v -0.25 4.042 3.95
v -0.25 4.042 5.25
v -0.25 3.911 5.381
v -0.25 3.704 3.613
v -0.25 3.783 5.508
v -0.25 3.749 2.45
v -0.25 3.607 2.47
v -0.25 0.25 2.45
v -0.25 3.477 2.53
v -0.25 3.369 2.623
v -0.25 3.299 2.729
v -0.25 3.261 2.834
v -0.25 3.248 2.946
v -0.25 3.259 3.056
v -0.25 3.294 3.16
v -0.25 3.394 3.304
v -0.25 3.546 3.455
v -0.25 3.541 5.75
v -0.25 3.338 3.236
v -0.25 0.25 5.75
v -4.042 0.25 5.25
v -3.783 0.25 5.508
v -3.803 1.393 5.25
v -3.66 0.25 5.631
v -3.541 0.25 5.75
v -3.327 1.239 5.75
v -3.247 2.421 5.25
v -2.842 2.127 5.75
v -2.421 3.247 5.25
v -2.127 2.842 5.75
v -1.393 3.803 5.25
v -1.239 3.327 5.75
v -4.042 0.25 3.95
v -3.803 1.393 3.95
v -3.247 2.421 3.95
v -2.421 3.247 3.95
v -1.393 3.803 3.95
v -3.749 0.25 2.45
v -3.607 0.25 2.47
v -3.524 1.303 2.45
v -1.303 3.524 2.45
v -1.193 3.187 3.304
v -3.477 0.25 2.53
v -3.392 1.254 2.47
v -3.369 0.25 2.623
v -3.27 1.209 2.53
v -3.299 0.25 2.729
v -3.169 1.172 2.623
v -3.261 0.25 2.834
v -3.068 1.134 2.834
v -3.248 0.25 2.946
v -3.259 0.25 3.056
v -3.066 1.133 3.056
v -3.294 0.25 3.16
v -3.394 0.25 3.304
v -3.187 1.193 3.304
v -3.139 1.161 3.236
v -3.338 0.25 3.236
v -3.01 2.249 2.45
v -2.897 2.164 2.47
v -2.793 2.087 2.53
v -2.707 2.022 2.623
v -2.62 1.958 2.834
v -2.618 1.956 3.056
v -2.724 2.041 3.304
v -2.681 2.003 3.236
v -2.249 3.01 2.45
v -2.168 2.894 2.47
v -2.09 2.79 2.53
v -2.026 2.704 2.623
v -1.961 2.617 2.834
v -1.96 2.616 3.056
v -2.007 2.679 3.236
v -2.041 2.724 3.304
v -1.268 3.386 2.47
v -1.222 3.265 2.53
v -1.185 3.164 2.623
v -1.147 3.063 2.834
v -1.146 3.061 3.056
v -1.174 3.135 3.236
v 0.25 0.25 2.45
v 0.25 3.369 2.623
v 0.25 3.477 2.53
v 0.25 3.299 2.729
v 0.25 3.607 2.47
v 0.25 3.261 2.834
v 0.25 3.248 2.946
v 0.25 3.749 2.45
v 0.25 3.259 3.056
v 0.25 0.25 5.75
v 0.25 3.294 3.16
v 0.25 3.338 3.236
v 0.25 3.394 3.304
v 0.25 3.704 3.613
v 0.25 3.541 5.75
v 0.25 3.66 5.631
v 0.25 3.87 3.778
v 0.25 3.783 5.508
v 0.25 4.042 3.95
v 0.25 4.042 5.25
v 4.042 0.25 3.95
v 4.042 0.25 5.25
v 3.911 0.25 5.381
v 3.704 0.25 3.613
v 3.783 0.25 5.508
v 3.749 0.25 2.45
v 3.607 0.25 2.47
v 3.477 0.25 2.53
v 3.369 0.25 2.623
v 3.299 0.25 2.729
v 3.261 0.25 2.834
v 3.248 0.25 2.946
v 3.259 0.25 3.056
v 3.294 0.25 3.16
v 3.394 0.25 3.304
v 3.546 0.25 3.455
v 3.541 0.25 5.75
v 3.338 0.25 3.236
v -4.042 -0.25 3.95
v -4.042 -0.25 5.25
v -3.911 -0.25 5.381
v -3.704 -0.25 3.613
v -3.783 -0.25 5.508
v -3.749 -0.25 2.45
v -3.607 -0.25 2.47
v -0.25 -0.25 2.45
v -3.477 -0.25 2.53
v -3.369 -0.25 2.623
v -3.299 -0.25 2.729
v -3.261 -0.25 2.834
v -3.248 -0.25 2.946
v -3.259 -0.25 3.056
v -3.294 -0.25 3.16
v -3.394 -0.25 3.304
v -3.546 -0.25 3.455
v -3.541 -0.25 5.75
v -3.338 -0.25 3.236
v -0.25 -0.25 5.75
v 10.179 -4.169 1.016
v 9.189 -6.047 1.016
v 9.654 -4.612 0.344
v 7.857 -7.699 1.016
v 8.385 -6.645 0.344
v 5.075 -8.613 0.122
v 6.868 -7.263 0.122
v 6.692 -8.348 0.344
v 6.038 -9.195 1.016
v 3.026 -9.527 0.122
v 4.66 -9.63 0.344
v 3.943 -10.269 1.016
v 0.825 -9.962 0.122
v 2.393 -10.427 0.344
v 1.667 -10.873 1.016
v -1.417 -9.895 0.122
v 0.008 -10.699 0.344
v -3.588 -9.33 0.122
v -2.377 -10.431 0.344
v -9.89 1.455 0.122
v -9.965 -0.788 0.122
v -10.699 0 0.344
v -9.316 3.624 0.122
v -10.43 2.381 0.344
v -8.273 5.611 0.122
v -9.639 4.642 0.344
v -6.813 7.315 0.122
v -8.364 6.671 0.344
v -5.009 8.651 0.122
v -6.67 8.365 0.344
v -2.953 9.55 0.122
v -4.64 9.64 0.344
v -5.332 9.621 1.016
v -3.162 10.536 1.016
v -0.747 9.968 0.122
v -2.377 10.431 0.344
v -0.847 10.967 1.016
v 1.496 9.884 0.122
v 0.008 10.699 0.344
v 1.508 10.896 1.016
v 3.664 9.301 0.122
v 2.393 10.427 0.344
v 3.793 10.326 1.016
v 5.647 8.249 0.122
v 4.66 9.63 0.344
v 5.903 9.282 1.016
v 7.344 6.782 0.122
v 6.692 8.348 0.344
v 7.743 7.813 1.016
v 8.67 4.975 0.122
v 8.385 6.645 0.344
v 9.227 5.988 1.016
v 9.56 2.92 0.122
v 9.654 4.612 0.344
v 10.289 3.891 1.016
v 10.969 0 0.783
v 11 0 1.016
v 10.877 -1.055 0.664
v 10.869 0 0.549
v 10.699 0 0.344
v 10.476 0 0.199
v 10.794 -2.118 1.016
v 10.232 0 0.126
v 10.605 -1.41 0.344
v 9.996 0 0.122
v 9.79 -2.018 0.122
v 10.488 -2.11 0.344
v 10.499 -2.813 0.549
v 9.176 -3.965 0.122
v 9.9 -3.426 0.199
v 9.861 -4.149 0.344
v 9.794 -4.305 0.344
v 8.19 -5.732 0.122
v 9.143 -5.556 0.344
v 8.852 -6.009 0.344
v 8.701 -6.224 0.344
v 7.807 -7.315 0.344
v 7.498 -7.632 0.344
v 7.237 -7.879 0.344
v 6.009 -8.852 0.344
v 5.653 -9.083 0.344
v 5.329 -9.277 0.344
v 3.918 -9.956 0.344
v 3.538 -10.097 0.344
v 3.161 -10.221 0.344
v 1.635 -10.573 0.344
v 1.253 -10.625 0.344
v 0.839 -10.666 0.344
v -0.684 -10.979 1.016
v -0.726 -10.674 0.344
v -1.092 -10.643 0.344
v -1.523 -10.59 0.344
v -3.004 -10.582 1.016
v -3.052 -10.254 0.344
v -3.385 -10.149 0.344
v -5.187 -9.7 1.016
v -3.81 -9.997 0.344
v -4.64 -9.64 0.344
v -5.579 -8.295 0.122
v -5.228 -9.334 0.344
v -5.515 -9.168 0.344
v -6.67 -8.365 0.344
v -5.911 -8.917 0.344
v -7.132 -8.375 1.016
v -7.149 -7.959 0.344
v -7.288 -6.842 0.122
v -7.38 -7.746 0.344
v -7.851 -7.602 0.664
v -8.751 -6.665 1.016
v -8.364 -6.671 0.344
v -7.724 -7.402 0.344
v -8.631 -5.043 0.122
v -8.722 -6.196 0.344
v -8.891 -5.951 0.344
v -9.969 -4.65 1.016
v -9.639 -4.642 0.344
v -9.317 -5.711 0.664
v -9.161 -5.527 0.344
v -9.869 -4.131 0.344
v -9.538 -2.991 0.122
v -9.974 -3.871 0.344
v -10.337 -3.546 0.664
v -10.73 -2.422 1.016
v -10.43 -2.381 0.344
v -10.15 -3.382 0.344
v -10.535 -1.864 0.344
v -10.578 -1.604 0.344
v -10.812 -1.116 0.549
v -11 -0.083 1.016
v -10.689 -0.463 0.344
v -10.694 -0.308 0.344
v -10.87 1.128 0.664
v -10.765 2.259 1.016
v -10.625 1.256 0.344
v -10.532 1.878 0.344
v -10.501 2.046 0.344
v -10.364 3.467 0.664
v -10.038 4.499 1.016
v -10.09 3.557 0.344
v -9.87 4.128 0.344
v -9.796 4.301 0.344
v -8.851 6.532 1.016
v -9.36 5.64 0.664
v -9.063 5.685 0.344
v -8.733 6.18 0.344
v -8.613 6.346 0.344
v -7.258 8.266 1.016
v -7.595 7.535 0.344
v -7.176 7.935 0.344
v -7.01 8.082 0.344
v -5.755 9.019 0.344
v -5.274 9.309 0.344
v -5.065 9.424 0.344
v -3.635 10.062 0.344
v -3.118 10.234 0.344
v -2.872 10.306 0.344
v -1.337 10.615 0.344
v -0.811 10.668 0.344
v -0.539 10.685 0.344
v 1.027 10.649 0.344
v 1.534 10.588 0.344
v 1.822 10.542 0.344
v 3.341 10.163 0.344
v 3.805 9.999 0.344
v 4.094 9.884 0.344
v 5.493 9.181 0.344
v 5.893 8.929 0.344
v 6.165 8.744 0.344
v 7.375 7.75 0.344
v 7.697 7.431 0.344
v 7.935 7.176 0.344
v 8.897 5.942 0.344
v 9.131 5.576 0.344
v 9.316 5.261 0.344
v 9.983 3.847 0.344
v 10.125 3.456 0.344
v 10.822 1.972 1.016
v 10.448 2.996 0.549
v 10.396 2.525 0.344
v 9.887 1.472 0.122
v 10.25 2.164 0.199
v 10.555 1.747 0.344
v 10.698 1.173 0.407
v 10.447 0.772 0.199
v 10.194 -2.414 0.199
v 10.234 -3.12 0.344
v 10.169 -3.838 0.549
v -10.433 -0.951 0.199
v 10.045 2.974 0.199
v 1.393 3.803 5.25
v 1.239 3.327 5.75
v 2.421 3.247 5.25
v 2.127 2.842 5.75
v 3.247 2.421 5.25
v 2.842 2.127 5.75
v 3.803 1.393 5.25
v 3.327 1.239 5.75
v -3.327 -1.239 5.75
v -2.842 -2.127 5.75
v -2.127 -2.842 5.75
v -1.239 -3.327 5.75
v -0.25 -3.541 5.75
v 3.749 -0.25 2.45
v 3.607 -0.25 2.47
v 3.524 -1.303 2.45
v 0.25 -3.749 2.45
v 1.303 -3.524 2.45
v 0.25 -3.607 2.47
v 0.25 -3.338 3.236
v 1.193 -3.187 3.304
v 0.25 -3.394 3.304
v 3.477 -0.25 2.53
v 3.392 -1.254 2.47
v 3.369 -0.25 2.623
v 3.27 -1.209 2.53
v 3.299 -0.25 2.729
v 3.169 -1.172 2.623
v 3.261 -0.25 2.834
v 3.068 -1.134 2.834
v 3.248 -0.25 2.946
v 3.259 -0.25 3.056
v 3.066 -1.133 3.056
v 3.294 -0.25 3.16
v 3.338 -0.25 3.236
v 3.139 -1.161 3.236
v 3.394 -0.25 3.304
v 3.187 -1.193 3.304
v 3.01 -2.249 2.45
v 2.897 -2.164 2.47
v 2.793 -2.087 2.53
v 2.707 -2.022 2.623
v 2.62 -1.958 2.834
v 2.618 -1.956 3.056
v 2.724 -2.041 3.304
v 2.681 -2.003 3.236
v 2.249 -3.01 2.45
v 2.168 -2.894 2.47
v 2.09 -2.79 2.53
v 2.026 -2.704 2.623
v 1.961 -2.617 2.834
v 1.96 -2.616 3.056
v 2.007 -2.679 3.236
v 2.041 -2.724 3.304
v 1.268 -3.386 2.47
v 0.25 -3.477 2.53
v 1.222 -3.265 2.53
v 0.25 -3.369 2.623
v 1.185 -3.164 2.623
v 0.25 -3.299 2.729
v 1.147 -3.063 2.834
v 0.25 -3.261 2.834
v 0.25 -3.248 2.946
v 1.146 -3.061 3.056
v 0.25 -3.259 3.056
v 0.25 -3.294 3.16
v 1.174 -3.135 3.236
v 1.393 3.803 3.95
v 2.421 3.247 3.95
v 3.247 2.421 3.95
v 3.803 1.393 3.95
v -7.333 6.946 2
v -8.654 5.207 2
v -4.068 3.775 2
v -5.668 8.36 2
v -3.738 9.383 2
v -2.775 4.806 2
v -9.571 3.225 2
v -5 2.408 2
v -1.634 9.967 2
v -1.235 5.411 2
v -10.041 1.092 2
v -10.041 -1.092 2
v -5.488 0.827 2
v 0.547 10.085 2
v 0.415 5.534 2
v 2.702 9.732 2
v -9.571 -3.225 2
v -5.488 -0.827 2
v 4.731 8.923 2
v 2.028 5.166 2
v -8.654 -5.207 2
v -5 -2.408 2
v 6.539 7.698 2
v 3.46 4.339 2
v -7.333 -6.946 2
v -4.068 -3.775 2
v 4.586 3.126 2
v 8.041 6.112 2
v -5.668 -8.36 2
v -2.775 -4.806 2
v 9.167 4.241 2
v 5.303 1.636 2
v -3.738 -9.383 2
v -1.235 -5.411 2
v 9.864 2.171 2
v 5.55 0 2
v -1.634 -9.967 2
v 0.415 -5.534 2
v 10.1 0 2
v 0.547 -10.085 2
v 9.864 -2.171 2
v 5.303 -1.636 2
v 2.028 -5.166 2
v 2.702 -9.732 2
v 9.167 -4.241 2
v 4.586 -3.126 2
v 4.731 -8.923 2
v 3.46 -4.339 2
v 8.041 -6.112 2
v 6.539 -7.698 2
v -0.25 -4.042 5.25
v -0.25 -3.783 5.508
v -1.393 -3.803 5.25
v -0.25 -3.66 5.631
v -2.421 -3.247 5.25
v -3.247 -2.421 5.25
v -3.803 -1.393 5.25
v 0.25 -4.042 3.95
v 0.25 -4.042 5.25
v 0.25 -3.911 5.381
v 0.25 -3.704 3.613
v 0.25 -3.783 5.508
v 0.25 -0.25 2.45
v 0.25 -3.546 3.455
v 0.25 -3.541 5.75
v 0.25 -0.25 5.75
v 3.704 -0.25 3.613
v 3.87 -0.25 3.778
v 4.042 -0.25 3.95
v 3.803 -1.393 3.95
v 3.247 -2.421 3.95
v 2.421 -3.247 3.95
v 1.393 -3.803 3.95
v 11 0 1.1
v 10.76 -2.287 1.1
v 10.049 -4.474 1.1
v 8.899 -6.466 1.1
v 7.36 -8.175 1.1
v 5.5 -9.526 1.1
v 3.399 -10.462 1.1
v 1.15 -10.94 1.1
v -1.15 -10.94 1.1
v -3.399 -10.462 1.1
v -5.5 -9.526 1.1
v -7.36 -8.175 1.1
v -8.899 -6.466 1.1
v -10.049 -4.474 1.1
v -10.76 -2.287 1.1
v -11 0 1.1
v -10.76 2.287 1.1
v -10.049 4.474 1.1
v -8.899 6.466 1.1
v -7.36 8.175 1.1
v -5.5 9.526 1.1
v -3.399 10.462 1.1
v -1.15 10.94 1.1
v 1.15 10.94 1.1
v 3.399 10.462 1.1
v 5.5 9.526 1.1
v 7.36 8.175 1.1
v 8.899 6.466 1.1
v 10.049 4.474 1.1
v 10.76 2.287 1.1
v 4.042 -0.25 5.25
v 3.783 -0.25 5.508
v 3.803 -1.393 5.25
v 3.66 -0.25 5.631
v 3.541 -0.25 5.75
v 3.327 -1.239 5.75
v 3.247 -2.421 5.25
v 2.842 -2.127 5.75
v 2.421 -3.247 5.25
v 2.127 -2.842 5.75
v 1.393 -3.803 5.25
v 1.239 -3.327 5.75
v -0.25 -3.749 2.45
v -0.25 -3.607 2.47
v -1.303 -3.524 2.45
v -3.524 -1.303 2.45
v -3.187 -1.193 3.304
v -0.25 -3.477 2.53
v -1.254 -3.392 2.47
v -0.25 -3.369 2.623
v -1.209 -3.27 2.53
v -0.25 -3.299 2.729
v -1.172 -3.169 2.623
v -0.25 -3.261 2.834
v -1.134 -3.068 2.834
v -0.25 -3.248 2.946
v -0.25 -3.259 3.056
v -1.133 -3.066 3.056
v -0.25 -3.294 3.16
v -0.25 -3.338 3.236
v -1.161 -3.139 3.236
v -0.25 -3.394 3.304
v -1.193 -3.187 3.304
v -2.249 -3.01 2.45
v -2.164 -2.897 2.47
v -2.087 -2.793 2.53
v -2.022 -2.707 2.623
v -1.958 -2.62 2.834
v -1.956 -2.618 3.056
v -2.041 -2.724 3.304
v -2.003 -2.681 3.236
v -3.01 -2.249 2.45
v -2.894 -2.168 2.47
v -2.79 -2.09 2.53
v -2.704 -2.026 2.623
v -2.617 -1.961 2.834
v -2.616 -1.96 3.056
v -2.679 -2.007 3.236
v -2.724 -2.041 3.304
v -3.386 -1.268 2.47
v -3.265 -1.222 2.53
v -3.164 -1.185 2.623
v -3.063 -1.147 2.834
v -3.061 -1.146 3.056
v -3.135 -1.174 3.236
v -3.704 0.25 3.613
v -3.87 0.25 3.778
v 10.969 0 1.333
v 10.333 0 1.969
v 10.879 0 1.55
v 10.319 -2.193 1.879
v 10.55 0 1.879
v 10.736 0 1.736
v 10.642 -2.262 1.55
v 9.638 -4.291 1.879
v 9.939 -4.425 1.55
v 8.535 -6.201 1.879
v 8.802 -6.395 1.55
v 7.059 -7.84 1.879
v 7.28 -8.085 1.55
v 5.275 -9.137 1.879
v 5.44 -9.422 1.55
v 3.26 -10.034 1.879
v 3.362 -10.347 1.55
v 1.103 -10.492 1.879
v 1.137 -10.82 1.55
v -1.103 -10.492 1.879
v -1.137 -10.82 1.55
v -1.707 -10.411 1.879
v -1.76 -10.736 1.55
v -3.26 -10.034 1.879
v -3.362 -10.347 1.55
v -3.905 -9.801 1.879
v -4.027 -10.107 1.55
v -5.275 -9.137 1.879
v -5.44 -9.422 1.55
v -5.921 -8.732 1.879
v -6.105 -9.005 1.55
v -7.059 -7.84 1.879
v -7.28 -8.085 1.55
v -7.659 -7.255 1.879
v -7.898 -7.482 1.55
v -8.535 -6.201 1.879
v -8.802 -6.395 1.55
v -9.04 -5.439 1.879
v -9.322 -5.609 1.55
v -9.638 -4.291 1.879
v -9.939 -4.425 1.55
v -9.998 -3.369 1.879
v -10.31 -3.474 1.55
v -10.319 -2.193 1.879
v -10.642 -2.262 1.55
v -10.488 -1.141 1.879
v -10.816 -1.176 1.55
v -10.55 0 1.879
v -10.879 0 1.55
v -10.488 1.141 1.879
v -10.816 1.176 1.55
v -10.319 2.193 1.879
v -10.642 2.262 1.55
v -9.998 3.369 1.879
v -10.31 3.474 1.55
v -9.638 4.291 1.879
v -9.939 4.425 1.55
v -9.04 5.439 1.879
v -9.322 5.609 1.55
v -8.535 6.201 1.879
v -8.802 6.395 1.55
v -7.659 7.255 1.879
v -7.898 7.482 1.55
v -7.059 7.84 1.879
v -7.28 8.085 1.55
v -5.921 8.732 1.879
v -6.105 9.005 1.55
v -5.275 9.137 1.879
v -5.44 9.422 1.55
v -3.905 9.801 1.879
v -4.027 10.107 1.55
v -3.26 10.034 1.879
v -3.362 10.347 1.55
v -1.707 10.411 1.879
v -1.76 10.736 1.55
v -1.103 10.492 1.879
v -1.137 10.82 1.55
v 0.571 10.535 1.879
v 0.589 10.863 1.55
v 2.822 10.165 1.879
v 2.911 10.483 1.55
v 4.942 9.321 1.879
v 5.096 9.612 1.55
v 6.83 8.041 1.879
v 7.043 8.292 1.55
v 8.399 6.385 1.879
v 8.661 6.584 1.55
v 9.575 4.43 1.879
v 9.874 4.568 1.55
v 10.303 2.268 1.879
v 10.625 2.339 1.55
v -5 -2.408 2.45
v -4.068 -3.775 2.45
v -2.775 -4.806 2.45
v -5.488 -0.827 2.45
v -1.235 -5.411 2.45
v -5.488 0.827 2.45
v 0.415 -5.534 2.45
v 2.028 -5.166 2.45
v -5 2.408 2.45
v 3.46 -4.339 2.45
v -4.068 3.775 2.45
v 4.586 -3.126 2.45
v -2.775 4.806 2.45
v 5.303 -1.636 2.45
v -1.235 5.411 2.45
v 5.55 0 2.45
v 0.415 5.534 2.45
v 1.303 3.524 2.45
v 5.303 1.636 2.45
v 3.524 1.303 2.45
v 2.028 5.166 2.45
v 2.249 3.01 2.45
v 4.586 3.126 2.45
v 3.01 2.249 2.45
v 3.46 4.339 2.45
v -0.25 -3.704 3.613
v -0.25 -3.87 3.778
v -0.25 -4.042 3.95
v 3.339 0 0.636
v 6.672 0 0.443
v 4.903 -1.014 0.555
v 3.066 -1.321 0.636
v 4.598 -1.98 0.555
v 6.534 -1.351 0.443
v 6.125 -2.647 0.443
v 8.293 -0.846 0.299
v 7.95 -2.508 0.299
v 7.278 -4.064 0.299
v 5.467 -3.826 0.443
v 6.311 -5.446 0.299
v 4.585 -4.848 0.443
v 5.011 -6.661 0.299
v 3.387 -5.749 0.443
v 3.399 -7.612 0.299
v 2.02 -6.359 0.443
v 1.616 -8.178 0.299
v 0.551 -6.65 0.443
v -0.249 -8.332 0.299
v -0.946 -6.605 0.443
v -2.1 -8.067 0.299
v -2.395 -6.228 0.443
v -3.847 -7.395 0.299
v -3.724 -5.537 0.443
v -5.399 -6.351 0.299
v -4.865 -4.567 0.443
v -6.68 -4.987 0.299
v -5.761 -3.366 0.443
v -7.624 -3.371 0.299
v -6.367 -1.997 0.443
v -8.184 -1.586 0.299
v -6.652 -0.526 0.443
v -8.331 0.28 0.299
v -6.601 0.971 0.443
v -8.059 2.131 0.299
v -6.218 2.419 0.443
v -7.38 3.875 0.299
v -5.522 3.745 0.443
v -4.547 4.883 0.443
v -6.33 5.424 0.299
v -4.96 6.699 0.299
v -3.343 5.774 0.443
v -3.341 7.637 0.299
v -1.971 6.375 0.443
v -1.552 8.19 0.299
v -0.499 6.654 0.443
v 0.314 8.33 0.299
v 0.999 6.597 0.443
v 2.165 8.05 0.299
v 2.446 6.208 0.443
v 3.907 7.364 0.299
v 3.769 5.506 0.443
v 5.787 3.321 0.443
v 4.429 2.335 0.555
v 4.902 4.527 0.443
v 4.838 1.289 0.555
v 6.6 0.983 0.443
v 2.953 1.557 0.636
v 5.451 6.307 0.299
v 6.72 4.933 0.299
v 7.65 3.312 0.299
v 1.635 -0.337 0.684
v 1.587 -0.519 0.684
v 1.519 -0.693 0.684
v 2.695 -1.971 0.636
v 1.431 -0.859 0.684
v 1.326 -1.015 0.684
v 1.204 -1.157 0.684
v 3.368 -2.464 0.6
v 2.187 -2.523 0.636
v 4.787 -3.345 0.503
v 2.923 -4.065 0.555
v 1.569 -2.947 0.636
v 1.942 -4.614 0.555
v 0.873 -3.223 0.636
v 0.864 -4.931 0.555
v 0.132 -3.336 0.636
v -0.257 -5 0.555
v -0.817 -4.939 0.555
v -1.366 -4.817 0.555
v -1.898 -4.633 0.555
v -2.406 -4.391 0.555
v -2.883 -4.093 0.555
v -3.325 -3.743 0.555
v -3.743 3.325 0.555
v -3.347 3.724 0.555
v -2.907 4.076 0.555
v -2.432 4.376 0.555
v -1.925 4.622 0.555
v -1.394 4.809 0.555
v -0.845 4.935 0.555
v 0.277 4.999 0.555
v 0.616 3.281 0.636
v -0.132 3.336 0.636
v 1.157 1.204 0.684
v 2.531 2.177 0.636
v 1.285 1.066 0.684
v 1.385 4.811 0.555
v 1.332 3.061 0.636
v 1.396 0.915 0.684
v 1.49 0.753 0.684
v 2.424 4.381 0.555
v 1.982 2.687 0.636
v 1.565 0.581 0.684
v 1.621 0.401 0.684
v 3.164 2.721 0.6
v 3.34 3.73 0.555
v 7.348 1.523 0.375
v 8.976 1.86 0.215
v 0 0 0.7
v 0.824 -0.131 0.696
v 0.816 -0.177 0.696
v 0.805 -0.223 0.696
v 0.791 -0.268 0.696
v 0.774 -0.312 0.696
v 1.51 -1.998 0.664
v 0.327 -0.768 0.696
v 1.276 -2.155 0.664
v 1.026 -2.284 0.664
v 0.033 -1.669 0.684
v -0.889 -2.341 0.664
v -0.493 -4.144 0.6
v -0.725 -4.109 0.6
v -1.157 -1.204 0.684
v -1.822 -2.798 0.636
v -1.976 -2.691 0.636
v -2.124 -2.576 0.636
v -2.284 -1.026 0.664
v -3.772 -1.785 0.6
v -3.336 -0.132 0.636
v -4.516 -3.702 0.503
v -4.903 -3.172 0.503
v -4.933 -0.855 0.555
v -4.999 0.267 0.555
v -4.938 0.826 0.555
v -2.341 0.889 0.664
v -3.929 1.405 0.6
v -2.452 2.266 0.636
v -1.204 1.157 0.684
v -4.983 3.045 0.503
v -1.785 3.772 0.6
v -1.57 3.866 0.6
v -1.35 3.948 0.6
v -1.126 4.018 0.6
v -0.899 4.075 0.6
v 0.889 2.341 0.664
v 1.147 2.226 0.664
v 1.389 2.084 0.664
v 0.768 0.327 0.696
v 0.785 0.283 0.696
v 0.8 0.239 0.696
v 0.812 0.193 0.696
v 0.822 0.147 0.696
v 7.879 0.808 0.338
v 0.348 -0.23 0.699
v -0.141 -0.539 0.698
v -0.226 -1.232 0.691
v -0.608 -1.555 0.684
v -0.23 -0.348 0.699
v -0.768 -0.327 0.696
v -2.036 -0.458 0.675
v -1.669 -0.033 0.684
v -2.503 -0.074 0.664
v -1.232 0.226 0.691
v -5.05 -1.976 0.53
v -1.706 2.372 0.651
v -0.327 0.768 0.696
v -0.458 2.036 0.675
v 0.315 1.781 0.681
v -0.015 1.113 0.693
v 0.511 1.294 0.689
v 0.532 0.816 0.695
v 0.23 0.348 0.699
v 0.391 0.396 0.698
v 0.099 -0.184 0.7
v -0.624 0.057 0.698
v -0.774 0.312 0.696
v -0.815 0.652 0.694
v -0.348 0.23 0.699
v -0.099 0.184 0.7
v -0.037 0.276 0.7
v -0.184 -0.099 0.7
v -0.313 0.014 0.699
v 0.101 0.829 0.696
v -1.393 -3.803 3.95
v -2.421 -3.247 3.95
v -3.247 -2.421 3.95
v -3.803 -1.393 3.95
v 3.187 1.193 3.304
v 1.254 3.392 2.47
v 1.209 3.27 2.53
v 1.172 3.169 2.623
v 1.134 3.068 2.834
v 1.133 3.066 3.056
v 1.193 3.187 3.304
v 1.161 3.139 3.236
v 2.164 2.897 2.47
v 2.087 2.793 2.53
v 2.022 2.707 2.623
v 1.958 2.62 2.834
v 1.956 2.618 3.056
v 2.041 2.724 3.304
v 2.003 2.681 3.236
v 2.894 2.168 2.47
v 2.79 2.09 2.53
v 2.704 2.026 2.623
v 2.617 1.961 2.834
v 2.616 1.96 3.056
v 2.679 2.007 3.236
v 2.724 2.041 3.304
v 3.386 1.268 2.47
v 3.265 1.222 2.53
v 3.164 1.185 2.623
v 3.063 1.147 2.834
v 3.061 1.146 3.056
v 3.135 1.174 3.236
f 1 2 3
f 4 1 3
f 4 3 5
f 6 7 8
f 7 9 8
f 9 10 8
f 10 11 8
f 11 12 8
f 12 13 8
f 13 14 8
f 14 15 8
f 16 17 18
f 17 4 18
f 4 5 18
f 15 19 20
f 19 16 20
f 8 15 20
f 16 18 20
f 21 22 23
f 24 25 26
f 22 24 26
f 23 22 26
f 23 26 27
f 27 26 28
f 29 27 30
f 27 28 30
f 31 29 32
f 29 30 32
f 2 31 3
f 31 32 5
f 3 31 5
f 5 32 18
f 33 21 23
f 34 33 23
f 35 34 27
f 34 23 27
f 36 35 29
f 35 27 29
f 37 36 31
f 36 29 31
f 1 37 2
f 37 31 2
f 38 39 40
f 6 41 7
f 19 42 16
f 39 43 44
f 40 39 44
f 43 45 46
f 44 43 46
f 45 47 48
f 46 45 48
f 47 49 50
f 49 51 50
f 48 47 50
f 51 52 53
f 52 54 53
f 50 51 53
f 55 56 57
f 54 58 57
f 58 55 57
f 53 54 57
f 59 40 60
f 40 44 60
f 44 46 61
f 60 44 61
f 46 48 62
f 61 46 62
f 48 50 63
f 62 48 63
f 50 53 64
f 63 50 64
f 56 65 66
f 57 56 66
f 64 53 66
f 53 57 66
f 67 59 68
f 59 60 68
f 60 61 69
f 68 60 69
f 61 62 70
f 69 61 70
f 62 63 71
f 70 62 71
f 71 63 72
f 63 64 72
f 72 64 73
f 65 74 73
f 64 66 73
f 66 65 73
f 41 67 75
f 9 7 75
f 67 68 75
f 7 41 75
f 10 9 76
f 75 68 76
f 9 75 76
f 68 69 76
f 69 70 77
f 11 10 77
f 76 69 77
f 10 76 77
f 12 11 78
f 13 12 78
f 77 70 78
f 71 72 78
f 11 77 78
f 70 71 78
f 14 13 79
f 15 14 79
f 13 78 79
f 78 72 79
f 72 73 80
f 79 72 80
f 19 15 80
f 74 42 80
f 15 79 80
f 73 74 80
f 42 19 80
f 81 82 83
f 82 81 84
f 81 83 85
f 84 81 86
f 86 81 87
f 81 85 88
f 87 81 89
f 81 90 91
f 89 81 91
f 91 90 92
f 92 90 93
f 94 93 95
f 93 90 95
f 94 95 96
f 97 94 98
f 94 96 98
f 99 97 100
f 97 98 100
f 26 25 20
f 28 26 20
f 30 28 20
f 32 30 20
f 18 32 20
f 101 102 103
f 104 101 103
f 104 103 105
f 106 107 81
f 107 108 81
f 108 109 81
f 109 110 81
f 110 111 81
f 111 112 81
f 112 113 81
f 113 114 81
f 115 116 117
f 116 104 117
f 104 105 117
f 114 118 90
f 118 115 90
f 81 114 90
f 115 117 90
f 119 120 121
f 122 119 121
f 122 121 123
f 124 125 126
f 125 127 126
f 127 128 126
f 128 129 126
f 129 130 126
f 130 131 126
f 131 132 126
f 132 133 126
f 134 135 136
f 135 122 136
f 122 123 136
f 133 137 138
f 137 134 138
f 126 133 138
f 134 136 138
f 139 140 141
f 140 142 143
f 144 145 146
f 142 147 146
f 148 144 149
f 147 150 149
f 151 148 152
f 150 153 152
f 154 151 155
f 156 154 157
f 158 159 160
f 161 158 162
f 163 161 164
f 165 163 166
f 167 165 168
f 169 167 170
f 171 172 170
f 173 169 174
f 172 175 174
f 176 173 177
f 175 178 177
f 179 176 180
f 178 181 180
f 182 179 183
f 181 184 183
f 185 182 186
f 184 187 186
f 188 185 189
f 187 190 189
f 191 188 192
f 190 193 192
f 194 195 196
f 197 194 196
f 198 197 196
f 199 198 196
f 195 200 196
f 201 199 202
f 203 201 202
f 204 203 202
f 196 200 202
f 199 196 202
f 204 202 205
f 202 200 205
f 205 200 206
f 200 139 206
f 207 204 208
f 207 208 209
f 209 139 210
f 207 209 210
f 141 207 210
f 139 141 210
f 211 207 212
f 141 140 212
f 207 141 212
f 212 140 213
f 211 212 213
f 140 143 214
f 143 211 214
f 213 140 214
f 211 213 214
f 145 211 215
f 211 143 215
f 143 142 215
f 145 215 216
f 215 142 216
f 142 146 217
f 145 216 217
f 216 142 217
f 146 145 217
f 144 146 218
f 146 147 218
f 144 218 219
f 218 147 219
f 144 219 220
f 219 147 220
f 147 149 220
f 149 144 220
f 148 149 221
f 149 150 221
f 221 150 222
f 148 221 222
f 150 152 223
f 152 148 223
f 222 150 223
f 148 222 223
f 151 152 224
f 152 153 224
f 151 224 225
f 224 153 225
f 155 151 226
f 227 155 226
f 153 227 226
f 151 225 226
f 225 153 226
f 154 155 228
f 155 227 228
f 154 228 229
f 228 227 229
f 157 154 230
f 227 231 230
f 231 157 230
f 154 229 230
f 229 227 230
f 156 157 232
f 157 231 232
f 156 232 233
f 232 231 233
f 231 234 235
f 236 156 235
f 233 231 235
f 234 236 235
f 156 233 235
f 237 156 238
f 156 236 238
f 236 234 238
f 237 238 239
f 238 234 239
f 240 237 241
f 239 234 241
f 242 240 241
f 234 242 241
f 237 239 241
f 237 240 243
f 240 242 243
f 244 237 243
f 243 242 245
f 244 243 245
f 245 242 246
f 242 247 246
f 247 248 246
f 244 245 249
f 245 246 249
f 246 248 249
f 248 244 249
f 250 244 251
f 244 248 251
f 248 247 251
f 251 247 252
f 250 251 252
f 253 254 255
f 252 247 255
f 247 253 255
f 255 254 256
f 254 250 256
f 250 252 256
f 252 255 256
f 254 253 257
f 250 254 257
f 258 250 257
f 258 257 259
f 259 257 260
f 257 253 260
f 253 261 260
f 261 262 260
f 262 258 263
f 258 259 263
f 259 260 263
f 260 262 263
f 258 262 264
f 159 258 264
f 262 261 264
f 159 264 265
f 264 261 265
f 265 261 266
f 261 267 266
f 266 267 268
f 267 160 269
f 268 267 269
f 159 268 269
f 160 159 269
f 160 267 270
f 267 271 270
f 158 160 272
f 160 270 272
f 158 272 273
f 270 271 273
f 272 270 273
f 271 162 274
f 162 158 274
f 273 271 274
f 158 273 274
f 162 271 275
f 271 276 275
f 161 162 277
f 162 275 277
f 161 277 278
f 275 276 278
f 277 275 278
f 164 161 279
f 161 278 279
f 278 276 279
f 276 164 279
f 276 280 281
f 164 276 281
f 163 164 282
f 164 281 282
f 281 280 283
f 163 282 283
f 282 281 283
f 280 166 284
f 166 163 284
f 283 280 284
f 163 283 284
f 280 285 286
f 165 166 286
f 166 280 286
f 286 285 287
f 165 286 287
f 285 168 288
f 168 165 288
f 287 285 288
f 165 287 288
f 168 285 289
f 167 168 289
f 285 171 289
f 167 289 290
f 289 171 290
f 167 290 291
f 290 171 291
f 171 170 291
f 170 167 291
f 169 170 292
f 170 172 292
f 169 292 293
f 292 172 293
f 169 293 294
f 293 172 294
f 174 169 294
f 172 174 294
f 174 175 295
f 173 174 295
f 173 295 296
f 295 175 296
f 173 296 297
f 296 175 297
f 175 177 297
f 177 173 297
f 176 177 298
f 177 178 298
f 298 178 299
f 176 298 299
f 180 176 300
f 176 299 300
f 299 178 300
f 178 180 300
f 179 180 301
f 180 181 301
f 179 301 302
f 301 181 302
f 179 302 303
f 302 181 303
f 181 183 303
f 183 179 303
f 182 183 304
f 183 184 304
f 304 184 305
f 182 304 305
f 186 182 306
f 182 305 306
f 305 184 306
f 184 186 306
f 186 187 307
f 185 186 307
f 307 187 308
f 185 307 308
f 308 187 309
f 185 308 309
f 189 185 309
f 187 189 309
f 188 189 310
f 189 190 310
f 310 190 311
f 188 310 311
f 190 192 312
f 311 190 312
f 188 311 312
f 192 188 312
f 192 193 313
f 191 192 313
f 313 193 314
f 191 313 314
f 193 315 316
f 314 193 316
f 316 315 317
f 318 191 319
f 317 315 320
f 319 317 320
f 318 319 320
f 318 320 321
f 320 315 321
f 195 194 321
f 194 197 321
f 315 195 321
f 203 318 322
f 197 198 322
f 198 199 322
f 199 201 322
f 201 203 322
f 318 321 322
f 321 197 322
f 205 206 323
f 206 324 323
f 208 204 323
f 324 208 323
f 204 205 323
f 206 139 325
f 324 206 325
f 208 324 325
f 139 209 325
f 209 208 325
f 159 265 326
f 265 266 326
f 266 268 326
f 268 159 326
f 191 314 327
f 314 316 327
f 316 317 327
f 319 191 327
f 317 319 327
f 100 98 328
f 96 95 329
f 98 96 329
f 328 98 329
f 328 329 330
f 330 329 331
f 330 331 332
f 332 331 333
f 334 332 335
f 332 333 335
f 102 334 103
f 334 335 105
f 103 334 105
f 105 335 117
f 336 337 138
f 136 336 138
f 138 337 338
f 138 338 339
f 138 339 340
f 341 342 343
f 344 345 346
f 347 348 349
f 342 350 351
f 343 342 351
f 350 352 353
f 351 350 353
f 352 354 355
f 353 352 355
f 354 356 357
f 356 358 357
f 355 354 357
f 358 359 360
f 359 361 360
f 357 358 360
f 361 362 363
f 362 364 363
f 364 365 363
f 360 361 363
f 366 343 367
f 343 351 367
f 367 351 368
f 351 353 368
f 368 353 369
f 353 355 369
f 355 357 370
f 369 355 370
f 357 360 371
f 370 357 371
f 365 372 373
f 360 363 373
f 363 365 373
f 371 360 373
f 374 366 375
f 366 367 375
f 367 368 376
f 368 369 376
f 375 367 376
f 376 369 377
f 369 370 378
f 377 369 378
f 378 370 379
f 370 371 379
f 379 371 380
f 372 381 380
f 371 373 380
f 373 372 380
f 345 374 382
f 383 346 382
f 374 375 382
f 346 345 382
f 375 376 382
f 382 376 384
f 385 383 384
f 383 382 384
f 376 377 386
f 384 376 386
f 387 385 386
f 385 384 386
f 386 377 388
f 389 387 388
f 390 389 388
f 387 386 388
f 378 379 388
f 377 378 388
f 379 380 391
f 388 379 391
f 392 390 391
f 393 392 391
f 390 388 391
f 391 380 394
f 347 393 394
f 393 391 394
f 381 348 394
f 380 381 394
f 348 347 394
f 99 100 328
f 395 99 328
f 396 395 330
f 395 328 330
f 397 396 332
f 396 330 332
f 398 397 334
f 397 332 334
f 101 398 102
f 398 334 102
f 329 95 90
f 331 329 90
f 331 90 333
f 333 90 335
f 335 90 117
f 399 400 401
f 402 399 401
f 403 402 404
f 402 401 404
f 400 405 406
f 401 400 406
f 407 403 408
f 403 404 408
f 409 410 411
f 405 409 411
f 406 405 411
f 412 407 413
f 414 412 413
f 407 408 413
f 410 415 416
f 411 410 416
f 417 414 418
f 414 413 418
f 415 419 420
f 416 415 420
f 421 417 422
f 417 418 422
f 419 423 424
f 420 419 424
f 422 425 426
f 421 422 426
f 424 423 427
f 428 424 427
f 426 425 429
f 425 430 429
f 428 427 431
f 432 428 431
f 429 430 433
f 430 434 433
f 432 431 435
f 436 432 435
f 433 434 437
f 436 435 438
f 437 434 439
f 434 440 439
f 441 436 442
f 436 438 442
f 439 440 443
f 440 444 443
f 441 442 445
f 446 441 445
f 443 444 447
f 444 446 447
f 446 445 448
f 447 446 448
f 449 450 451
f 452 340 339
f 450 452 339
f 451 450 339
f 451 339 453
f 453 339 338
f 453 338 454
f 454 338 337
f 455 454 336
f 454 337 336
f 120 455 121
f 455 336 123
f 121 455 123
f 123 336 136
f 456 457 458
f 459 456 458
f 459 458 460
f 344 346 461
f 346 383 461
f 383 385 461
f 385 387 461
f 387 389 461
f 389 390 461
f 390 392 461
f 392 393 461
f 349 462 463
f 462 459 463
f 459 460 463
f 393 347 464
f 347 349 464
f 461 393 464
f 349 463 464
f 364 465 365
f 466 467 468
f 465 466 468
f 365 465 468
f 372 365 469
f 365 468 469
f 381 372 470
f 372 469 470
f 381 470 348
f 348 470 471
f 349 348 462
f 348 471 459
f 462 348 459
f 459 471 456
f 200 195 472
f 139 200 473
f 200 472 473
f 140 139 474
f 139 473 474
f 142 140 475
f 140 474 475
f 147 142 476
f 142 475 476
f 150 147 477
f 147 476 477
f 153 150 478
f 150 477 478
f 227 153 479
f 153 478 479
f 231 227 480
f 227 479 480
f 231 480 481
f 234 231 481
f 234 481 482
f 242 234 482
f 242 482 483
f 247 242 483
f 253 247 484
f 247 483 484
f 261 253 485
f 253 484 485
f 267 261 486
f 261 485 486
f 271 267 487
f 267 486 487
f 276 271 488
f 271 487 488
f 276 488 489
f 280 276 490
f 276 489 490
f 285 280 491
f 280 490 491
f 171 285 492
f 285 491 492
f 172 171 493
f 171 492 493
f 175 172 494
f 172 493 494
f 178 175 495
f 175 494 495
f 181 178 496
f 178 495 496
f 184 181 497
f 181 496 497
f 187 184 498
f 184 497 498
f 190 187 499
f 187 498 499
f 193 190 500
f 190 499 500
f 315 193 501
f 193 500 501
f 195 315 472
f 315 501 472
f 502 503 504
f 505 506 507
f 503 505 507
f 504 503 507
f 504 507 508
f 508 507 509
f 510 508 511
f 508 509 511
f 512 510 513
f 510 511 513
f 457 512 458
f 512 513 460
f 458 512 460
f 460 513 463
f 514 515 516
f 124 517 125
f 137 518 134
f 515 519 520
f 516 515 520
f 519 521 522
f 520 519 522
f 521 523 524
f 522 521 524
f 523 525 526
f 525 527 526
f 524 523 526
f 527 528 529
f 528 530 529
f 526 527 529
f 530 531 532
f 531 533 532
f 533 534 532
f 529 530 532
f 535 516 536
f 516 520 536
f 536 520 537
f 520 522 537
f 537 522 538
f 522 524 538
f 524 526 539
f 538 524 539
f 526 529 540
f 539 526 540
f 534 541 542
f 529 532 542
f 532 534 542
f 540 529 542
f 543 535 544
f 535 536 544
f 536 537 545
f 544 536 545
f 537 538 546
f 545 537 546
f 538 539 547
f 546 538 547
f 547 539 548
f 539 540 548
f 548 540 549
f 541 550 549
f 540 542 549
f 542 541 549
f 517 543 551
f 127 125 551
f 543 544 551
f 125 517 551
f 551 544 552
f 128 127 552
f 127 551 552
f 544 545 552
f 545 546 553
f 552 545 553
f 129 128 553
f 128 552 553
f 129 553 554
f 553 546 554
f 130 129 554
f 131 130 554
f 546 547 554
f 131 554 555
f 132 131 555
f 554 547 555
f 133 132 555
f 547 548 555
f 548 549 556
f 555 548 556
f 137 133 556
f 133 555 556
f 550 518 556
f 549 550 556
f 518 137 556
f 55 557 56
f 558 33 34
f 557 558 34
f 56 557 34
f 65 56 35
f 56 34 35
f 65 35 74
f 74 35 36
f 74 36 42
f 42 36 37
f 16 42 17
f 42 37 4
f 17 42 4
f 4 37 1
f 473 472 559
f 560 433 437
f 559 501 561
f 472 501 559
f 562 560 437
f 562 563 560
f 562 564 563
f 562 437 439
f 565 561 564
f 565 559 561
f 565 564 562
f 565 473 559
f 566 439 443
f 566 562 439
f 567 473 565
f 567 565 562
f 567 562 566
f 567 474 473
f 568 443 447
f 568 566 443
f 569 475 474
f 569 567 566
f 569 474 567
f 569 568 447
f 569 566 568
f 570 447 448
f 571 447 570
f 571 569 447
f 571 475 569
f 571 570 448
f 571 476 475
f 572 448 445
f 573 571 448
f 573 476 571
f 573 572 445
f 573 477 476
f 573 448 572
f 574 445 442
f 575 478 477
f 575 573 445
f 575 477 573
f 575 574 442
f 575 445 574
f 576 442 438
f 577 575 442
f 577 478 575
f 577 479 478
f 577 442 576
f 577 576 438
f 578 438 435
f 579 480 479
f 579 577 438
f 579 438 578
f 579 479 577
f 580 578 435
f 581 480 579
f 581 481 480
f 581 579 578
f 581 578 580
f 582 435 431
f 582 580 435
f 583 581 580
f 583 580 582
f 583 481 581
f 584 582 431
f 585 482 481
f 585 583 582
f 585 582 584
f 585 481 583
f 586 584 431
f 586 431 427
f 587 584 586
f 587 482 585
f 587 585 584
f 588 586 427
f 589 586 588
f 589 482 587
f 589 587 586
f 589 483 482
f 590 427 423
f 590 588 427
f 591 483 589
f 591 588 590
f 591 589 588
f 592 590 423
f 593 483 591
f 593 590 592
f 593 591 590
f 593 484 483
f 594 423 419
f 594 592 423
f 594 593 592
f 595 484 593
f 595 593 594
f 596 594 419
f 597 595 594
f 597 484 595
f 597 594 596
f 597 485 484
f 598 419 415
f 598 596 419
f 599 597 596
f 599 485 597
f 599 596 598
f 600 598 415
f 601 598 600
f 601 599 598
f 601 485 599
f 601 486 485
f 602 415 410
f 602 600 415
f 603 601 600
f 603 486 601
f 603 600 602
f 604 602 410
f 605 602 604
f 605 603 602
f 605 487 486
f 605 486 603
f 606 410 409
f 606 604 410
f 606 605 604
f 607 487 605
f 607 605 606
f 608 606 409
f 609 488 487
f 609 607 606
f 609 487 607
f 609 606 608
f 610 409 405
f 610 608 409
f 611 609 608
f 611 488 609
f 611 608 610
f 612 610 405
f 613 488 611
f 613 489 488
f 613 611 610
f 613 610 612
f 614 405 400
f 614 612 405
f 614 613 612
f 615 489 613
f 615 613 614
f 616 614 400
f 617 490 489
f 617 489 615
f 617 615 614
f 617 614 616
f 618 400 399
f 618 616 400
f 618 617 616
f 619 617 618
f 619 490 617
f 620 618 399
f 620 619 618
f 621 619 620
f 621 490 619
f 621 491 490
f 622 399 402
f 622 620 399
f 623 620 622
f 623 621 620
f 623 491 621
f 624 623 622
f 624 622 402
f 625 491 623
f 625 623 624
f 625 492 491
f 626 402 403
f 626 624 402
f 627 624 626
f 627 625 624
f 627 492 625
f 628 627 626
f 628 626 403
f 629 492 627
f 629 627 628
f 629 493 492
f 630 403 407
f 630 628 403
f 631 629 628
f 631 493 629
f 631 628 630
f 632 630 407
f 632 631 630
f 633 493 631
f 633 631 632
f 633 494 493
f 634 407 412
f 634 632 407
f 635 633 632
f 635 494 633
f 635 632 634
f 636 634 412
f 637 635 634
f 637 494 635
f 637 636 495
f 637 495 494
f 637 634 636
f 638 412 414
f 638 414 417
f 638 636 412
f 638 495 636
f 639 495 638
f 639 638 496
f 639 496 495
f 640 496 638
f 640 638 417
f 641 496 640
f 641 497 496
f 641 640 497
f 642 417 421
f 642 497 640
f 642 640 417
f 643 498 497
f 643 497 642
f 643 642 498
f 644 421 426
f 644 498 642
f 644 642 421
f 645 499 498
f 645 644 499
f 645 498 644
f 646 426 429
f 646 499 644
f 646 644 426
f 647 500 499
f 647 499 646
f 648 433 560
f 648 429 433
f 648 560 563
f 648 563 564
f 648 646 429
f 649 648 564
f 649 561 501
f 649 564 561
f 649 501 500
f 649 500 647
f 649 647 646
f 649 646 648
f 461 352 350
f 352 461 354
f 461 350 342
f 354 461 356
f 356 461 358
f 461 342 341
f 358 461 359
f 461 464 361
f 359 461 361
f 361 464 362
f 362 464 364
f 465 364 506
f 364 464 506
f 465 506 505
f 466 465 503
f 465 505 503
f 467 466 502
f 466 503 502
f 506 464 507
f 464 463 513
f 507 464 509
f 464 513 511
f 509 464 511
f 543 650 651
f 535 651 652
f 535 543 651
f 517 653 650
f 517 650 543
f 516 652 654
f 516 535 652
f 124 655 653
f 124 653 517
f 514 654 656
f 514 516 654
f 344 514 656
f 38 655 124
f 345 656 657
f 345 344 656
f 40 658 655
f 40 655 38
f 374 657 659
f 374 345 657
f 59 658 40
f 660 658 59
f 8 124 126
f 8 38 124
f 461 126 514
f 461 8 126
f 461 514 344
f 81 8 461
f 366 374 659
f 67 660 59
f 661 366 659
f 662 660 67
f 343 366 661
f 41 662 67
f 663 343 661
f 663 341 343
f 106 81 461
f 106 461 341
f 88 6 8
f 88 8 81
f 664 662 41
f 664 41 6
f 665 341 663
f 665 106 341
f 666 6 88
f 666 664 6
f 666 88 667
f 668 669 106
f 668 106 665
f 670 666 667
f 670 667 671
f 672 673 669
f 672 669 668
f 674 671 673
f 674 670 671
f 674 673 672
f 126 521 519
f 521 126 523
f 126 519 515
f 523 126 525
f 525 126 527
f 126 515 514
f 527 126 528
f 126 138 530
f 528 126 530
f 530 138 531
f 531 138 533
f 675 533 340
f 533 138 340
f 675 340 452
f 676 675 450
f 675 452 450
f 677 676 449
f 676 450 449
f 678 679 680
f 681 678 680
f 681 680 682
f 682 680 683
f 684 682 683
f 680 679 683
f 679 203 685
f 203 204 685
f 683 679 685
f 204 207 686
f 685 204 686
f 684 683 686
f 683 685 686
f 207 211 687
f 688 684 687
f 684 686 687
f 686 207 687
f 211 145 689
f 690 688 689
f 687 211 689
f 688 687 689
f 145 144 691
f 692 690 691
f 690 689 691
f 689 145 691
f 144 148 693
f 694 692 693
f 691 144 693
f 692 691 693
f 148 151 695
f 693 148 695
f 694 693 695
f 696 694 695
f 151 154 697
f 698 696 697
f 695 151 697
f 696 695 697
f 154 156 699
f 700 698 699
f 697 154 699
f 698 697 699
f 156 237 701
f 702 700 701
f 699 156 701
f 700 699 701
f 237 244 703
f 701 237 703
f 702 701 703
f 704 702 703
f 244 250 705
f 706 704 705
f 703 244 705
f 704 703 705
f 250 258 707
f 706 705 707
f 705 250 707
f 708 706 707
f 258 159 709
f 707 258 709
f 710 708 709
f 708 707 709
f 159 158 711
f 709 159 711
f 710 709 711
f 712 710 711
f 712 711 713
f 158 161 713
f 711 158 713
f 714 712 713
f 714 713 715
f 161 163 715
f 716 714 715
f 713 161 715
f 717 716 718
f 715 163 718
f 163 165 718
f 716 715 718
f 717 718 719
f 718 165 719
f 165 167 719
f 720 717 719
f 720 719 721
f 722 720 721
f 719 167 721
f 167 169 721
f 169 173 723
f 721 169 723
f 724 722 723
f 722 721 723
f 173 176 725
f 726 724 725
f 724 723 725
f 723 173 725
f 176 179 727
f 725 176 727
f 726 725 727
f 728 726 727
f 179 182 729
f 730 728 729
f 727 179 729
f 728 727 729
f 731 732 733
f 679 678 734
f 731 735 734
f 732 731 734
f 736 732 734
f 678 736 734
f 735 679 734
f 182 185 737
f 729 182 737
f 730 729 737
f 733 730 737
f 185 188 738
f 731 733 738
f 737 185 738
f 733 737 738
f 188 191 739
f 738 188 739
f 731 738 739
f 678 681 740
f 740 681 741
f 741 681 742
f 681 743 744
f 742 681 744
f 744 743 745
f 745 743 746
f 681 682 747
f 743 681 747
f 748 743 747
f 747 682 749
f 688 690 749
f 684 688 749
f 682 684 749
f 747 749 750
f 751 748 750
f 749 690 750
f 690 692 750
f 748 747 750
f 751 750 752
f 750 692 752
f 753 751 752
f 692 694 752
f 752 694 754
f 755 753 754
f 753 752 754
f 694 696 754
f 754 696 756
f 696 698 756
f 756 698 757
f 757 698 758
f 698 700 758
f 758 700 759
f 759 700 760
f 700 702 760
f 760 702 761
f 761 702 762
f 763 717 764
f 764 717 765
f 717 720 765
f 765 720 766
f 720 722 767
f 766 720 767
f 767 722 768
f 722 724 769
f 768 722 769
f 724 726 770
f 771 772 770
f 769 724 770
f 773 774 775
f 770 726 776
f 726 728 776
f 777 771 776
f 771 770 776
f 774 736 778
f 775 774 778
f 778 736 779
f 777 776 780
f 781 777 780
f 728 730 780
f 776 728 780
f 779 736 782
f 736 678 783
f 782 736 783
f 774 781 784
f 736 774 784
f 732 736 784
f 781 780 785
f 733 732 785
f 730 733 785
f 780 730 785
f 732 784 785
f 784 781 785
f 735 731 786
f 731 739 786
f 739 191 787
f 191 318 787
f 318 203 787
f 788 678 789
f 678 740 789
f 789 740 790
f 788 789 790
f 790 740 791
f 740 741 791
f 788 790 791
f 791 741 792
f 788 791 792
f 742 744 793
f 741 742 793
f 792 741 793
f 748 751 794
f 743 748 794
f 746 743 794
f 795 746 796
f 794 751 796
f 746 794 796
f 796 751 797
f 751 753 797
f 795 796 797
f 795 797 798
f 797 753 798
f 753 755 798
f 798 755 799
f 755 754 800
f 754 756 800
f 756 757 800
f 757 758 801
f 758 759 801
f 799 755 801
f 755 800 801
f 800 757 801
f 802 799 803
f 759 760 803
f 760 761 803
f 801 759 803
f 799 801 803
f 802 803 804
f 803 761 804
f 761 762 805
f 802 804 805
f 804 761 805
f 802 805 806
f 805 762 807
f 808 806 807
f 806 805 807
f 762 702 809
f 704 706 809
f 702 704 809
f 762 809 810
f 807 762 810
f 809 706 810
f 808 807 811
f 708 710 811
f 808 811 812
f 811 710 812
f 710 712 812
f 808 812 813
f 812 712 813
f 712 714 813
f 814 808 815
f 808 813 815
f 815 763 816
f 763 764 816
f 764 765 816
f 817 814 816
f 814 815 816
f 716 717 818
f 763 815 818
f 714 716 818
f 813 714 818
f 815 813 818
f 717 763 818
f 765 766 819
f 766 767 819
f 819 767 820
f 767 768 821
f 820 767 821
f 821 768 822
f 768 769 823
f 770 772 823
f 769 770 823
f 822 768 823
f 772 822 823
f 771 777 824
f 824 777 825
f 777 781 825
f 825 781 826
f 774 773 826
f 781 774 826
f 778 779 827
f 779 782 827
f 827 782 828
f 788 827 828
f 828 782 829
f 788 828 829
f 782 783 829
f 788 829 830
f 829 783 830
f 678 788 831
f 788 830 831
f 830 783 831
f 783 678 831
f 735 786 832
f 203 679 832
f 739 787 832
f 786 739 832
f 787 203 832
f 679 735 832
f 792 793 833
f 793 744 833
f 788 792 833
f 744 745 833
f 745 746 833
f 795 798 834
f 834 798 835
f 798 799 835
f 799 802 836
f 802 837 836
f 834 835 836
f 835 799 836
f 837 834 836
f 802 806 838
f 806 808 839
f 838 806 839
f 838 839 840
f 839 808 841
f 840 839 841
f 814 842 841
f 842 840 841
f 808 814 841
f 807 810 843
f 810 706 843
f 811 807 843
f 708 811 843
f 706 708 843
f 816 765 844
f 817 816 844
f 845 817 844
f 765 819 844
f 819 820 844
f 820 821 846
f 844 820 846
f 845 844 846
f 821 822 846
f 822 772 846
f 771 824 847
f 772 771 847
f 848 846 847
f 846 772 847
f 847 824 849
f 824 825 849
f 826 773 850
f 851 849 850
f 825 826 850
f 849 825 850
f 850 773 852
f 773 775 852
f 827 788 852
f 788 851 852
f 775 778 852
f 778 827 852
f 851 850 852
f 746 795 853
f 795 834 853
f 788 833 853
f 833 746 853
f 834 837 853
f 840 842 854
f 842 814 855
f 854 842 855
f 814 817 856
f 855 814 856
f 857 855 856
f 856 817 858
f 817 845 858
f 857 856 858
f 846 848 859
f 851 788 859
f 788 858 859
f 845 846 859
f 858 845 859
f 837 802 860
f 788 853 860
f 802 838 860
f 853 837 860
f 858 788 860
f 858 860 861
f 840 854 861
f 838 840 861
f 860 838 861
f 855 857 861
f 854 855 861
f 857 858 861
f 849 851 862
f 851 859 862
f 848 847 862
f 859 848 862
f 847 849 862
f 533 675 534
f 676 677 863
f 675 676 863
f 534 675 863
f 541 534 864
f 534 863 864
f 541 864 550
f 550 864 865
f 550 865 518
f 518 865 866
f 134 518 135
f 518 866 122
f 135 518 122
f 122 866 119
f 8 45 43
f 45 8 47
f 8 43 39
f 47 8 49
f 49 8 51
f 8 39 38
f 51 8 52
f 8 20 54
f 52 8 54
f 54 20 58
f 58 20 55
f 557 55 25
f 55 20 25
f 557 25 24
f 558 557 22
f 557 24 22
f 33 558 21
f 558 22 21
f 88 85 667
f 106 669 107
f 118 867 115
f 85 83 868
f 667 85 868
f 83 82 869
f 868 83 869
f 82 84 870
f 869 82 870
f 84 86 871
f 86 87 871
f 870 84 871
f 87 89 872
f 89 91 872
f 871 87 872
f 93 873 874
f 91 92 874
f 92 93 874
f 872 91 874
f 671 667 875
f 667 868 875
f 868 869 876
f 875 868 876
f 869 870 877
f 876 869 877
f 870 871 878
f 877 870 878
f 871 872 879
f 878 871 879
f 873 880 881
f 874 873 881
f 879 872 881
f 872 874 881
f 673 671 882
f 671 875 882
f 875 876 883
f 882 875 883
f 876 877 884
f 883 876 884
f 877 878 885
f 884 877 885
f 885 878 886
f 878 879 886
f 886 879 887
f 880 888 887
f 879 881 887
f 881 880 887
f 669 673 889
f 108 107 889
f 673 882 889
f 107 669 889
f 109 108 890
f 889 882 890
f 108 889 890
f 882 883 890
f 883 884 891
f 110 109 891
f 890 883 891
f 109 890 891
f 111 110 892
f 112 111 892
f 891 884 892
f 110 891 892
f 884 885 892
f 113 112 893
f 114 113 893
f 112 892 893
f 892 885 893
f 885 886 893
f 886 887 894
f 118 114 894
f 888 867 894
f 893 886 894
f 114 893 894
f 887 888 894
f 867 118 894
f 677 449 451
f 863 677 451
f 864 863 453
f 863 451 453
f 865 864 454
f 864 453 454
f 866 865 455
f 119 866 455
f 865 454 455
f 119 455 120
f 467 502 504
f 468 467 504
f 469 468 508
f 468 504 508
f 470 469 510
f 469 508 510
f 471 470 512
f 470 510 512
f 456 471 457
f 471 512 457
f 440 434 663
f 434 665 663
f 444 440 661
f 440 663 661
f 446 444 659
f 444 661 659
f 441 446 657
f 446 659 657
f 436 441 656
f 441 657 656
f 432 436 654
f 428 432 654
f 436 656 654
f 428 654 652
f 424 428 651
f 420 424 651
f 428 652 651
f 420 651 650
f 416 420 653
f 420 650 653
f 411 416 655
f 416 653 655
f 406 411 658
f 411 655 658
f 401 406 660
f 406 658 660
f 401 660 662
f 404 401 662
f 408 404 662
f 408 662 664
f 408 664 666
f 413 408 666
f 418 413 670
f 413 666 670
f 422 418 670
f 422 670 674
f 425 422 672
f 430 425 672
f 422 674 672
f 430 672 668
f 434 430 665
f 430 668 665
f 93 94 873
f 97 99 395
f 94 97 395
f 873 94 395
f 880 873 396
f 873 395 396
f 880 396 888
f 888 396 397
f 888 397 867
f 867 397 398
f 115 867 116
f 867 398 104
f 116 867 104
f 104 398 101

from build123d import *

# Parameters (mm, degrees)
F2_R     = 0.5
F3_R     = 0.9
F4_SIZE  = 0.5
F6_DEPTH = 3.3


with BuildPart() as f1:
    # F0 (on Front) → F1 (revolve)
    with BuildSketch(Plane.XZ):
        with BuildLine():
            ThreePointArc((0, 0.7), (5.511125, 0.524823), (11, 0))
            Line((11, 0), (11, 2))
            Line((11, 2), (5.55, 2))
            Line((5.55, 2), (5.55, 2.45))
            Line((5.55, 2.45), (2.55, 2.45))
            Line((2.55, 2.45), (4.05, 3.95))
            Line((4.05, 3.95), (4.05, 5.75))
            Line((4.05, 5.75), (0, 5.75))
            Line((0, 5.75), (0, 0.7))
        make_face()
    revolve(axis=Axis((0, 0, 3.225), (0, 0, -1)))

    # F2
    f2_edges = [f1.edges().sort_by_distance(p)[0] for p in [
        (-2.55, 0, 2.45),
    ]]
    fillet(f2_edges, radius=F2_R)

    # F3
    f3_edges = [f1.edges().sort_by_distance(p)[0] for p in [
        (-11, 0, 0),
        (-11, 0, 2),
    ]]
    fillet(f3_edges, radius=F3_R)

    # F4
    f4_edges = [f1.edges().sort_by_distance(p)[0] for p in [
        (-4.05, 0, 5.75),
    ]]
    chamfer(f4_edges, length=F4_SIZE)

    # F5 (on face) → F6 (cut, through all)
    with BuildSketch(Plane.XY.offset(5.75)):
        Polygon((0.25, 4.5), (-0.25, 4.5), (-0.25, 0.25), (-4.5, 0.25), (-4.5, -0.25), (-0.25, -0.25), (-0.25, -4.5), (0.25, -4.5), (0.25, -0.25), (4.5, -0.25), (4.5, 0.25), (0.25, 0.25), align=None)
    extrude(amount=-F6_DEPTH, mode=Mode.SUBTRACT)


solid = f1.part
